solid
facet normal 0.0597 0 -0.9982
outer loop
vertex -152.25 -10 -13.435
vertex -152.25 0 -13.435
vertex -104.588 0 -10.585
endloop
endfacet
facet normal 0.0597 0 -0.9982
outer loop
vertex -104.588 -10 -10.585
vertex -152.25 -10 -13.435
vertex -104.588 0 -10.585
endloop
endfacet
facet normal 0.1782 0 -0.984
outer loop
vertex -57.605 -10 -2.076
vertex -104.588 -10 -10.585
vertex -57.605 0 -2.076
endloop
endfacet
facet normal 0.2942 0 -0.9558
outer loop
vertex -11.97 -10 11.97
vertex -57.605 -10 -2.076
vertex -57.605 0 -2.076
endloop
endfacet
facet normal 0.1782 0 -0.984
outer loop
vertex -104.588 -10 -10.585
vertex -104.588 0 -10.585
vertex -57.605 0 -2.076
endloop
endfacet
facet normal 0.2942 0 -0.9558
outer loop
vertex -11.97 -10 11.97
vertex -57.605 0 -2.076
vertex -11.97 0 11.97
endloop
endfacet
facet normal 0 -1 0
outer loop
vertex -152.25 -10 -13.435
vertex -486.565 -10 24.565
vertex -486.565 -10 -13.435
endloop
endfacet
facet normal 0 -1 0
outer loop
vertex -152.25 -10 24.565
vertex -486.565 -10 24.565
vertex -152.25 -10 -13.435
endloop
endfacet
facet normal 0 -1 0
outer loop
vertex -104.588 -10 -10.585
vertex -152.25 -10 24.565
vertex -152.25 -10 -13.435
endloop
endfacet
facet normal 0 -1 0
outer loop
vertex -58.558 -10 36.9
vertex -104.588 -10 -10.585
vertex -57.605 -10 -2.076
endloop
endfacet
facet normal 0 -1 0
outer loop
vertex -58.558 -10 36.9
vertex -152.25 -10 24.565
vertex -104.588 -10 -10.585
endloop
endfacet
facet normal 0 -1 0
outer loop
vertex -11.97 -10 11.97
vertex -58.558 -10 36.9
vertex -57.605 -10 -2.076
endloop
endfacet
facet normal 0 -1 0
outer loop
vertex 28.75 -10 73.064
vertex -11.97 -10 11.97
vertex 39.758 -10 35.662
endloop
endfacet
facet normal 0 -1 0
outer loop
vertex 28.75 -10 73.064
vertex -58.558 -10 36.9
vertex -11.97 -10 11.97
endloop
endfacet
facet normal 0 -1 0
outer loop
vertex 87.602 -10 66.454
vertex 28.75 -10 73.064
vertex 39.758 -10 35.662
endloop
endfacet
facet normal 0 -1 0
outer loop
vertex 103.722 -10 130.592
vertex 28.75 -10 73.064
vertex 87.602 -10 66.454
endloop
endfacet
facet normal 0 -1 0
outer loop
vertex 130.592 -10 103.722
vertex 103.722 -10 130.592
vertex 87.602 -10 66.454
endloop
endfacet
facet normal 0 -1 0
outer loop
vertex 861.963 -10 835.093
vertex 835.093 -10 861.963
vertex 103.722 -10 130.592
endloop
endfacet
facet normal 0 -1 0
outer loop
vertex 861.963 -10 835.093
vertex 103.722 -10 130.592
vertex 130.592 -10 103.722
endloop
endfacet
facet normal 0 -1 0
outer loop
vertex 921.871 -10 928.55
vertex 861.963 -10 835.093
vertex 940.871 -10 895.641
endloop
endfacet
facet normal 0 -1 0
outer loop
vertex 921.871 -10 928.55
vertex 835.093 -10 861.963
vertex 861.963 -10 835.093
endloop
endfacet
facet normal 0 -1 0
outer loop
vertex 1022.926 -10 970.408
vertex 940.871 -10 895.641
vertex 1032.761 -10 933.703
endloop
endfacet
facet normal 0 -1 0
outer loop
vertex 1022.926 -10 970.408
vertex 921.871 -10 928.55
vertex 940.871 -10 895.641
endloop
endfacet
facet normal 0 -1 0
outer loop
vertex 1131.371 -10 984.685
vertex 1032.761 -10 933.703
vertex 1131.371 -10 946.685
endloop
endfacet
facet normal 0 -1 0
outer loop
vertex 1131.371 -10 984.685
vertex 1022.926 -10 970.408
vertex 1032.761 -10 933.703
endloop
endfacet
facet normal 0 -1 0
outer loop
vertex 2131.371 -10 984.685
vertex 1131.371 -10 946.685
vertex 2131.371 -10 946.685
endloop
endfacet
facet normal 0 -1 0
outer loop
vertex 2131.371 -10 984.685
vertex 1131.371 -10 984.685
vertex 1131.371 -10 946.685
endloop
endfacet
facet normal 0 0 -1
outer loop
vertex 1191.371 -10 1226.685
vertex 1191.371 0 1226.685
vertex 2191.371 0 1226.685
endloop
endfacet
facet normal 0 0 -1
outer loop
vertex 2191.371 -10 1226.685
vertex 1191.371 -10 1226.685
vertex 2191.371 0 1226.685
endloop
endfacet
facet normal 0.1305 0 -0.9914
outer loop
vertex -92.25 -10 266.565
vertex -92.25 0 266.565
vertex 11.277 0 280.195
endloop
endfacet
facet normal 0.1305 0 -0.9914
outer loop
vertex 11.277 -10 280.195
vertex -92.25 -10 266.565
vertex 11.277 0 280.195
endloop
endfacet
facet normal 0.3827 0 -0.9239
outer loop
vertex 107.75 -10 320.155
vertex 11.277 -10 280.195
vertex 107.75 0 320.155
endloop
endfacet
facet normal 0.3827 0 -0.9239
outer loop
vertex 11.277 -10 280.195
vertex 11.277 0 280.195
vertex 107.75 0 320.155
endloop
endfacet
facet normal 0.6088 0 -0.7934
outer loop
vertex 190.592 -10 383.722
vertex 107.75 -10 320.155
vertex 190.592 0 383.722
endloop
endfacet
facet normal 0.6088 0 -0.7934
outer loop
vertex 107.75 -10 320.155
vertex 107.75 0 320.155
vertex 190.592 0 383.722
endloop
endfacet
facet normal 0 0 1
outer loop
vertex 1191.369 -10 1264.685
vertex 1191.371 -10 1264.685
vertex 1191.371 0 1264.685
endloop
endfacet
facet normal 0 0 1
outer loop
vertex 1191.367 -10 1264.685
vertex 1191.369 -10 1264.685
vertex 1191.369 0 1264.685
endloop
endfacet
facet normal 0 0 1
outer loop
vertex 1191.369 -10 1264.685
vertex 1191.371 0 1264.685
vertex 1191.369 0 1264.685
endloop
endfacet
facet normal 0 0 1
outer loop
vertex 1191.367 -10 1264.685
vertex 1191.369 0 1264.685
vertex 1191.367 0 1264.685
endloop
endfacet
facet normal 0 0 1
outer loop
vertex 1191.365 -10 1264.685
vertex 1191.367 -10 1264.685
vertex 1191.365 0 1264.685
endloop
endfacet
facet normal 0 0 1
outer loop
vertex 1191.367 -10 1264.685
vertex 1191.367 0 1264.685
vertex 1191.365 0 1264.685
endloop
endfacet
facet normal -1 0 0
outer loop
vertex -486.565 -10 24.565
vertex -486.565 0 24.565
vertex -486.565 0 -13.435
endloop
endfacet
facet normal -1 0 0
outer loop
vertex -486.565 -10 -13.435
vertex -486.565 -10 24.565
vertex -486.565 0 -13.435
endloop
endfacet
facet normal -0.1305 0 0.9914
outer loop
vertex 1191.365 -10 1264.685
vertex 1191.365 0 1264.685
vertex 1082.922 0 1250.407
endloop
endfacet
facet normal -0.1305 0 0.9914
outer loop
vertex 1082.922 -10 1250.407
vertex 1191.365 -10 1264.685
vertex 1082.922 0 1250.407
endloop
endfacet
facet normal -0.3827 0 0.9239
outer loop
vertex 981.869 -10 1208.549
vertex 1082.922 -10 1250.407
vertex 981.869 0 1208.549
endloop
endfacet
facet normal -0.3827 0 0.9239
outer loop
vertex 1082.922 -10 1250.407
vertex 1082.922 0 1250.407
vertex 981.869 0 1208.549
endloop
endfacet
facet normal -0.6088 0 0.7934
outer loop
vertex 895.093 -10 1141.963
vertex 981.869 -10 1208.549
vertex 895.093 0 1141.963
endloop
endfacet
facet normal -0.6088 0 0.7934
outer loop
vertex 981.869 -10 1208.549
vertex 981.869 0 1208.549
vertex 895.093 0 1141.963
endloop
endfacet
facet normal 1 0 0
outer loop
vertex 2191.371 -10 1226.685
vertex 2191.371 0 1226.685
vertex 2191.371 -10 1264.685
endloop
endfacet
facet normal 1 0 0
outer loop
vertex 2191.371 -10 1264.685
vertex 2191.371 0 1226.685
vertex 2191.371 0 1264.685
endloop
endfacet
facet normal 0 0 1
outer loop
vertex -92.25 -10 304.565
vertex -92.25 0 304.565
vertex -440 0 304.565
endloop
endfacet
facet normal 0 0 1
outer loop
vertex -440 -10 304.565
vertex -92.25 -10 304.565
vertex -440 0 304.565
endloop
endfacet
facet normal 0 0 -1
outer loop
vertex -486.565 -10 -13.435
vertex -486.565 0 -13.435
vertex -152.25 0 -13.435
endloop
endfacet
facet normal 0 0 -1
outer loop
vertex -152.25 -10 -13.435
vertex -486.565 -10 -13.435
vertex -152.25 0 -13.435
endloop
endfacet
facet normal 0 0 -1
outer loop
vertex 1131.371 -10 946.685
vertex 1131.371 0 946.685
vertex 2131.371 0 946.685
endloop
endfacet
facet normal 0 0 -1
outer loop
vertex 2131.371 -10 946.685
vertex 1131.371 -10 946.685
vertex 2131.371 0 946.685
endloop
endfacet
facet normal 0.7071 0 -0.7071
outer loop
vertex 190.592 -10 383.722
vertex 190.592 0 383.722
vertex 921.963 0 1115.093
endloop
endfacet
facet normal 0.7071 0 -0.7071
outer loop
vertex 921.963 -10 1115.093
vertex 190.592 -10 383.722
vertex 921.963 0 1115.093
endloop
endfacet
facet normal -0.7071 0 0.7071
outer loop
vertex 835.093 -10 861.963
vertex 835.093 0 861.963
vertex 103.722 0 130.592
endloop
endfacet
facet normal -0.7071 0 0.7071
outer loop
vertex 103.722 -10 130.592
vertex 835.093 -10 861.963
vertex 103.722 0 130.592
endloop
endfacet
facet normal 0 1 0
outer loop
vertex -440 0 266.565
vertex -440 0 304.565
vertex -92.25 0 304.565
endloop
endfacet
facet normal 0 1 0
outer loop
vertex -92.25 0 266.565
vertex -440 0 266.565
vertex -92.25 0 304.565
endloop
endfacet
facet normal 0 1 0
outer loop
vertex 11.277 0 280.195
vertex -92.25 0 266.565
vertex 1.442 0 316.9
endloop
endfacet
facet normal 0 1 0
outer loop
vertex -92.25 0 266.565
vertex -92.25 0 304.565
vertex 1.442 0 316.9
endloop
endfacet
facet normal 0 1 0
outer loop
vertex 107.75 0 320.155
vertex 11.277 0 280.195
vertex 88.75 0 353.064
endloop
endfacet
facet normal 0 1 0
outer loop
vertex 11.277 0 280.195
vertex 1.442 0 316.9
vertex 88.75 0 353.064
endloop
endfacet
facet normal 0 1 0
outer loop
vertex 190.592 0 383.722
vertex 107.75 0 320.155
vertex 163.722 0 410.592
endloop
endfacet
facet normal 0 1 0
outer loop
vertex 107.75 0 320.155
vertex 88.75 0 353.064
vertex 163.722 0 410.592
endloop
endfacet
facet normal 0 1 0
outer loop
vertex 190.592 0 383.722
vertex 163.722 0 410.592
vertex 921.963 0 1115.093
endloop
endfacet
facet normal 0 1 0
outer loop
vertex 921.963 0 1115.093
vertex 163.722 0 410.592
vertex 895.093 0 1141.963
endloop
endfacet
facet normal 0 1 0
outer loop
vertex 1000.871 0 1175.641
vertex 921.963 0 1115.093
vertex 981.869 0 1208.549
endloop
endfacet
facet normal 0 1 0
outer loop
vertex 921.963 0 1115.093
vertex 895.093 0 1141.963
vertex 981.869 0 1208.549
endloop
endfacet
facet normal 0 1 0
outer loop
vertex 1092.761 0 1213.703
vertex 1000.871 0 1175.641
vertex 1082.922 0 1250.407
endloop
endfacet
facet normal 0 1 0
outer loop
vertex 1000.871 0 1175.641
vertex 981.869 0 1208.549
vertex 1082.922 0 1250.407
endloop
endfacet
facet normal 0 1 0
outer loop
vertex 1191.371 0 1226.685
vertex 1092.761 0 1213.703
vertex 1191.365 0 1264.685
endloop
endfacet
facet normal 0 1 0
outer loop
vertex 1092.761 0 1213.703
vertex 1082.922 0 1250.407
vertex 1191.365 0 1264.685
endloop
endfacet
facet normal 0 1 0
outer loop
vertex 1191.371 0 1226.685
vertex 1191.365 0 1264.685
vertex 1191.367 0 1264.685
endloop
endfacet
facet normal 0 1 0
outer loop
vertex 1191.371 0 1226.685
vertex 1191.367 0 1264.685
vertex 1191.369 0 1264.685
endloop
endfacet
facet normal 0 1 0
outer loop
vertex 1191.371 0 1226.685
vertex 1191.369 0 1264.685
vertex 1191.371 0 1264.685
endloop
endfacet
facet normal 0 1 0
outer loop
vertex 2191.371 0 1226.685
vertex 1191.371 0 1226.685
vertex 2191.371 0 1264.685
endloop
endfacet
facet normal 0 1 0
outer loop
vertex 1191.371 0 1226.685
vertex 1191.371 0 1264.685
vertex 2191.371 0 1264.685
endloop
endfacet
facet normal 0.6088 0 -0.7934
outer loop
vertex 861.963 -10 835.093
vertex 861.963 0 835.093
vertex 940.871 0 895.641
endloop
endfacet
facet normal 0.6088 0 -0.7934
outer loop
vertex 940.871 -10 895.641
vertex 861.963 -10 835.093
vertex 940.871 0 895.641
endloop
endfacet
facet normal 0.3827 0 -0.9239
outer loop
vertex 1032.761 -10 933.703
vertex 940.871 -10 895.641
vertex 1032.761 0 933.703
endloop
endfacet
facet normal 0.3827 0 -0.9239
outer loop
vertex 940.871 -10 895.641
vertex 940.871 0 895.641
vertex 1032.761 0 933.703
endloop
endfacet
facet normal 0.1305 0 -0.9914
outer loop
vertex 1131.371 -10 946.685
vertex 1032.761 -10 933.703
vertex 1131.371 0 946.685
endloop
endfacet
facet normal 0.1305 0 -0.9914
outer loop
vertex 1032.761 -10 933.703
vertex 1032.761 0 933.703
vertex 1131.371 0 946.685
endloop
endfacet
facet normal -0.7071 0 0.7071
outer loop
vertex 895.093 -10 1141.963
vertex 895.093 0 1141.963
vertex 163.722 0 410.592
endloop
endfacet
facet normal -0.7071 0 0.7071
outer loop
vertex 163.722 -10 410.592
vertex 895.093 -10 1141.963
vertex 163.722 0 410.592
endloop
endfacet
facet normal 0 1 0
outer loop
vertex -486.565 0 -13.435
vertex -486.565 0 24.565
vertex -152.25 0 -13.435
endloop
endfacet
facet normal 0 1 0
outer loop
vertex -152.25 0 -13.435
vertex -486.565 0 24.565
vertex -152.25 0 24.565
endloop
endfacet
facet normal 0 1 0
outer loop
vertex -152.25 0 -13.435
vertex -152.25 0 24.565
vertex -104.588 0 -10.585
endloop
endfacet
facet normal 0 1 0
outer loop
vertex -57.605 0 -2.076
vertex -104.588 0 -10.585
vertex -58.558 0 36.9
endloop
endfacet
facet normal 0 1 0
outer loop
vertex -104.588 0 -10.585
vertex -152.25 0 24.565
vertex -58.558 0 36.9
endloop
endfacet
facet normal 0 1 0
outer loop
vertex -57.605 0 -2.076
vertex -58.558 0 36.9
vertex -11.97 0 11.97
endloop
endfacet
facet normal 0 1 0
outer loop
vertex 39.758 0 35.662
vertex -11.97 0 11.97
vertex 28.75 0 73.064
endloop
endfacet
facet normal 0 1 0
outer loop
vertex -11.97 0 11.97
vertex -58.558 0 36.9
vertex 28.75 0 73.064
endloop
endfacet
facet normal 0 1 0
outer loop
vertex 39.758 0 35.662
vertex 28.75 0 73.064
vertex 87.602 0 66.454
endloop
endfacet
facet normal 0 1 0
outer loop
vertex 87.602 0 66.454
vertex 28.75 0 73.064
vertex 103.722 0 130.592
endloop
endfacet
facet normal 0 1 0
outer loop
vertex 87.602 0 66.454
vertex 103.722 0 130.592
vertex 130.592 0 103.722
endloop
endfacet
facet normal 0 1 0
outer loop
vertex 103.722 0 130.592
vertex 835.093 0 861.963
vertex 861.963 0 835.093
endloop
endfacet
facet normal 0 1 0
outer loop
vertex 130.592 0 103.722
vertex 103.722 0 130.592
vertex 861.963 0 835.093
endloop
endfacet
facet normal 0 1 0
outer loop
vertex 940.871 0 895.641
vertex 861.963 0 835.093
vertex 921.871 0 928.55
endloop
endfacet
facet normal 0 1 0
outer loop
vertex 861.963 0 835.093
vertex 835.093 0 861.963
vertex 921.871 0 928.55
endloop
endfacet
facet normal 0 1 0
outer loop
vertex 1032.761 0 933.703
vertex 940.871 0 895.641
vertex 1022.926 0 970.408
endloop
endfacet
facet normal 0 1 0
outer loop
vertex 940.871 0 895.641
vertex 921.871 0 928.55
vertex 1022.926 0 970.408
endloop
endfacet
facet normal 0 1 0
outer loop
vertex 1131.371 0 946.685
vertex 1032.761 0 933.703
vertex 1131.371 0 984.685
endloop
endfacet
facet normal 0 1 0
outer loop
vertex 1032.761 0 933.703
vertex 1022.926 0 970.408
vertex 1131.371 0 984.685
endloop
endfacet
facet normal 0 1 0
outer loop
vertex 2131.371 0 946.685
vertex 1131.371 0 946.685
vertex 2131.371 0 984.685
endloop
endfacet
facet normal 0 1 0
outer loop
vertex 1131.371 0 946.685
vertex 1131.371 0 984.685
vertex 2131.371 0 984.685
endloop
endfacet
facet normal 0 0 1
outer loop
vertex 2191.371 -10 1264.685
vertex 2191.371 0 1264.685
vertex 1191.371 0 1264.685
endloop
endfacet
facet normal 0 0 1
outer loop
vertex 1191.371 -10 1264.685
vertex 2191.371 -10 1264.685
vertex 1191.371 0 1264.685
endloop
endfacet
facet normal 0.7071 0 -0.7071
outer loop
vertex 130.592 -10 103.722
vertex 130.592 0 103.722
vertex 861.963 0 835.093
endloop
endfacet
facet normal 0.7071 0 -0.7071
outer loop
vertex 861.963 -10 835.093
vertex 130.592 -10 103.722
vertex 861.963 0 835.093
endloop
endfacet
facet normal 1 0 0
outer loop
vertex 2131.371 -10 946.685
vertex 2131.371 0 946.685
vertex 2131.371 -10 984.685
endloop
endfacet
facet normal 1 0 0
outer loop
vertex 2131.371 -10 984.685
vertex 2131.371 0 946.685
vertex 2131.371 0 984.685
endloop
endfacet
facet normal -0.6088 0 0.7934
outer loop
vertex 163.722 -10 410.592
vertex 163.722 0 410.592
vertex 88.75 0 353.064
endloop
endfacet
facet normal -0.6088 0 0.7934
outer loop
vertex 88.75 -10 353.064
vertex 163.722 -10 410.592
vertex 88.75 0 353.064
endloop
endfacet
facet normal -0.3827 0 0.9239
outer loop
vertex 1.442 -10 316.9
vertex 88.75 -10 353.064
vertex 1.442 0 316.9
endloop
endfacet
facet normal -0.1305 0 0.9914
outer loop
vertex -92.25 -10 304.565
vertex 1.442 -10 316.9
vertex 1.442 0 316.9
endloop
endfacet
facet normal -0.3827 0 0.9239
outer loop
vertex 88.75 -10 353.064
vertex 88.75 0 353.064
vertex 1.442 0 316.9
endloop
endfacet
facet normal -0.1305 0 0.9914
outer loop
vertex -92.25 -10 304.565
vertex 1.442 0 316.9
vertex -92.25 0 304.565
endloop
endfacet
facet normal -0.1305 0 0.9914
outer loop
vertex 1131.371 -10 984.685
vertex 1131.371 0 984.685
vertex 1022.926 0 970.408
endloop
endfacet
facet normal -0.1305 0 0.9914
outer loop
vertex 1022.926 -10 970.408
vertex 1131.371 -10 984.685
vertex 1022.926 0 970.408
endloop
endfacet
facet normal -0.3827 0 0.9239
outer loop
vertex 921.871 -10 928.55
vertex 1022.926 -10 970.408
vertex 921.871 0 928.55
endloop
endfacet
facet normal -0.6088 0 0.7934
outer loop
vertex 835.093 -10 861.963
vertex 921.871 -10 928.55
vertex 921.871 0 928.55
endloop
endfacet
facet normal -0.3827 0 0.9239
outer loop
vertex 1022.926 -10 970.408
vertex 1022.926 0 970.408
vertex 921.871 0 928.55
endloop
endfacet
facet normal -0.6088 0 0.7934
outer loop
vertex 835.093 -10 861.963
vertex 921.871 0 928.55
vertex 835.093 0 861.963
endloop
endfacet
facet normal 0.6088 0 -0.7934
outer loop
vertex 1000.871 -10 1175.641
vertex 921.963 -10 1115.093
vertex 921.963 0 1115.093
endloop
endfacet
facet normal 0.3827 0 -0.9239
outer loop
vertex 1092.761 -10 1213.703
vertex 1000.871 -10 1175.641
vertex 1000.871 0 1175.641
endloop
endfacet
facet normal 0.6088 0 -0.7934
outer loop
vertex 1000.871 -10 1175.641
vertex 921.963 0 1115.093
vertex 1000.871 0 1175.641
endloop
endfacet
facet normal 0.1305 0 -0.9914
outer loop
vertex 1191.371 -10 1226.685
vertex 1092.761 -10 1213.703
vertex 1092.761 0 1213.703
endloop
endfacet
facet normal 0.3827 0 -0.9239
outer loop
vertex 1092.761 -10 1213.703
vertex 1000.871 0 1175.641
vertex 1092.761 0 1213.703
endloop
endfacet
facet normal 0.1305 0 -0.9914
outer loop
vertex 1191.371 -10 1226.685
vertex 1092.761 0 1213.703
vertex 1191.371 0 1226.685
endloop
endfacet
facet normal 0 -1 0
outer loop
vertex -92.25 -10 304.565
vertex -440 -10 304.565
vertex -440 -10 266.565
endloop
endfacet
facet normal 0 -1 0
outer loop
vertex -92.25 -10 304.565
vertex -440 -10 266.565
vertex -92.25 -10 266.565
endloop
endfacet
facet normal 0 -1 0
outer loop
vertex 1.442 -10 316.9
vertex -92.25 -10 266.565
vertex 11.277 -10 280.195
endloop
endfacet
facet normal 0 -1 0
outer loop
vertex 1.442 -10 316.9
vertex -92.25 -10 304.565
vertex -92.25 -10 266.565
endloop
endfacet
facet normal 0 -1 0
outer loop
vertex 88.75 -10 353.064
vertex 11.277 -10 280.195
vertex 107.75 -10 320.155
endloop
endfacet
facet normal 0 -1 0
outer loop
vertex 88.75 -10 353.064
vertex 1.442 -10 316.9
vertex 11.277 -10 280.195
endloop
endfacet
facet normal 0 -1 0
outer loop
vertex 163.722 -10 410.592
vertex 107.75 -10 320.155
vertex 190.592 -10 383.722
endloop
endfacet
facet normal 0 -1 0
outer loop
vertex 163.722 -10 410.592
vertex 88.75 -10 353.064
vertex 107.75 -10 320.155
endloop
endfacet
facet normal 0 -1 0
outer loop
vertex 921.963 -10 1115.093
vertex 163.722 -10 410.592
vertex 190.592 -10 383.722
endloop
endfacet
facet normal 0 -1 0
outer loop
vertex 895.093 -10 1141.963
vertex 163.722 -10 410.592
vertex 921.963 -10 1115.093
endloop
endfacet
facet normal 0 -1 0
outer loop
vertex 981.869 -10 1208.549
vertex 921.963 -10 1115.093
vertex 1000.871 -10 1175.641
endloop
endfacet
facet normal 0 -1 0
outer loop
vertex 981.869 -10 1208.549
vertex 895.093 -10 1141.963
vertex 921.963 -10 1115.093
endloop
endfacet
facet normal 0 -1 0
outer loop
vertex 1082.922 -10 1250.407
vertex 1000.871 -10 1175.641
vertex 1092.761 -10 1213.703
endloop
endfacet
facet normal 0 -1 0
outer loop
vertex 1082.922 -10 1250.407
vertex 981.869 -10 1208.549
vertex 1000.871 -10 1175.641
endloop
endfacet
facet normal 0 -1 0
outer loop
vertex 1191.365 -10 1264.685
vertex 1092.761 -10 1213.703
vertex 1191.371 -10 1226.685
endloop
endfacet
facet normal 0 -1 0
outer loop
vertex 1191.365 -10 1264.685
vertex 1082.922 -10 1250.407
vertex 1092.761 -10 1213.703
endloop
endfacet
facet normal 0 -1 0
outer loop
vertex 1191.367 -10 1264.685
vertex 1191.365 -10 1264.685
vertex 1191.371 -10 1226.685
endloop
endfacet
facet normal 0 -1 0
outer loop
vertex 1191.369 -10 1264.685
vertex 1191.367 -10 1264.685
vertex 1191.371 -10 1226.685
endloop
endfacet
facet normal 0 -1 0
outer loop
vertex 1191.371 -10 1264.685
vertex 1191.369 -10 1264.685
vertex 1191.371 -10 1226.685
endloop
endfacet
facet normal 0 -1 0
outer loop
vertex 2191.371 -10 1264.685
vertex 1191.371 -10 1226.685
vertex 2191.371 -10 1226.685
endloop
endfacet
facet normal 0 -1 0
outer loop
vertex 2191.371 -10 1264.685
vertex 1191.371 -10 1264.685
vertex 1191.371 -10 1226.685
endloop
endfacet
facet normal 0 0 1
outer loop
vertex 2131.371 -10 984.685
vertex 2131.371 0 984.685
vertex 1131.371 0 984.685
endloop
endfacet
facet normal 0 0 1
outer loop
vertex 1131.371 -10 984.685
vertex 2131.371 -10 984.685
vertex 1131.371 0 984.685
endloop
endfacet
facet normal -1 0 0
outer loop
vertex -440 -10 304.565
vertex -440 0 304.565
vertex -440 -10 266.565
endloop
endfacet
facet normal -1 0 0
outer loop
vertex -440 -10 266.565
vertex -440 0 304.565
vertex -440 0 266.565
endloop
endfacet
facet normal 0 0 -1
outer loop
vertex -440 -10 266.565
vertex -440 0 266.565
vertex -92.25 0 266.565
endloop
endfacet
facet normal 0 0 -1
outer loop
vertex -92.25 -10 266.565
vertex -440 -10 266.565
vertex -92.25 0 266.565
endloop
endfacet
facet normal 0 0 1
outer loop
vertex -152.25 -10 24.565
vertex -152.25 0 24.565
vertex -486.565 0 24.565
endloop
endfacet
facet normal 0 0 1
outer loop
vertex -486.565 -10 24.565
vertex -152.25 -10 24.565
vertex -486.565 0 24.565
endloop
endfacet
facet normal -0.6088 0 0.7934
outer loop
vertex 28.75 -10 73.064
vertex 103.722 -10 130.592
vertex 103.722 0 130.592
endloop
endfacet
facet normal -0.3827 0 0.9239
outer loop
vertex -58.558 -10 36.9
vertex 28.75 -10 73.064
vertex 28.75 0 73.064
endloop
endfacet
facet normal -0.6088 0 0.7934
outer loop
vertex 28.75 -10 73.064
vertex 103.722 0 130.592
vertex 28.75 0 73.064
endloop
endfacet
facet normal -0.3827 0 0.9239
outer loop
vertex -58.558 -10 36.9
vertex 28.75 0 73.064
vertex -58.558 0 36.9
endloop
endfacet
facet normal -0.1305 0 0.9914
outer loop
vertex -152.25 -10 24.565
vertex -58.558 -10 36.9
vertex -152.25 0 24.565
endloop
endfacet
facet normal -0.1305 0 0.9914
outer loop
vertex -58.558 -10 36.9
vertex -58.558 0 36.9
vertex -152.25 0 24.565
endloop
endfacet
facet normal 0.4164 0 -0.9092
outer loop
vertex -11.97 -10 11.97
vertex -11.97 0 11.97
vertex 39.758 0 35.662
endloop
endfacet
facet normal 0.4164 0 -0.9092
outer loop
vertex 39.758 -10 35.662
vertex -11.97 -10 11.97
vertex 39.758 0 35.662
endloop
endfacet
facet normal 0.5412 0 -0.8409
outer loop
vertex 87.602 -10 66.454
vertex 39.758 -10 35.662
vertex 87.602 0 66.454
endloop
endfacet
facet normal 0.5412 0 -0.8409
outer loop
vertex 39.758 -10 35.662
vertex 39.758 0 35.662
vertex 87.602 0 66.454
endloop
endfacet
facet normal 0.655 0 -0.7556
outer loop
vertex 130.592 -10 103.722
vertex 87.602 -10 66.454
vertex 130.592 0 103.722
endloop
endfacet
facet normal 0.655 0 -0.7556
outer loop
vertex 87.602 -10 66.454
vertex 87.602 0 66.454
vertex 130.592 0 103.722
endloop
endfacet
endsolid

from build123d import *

# Parameters (mm, degrees)
F1_DEPTH = 10


# Not quite as in the source:
# - a feature names something its author has since deleted; it is built from what else it names


with BuildPart() as f1:
    # F0 (on Front) → F1 (new body)
    with BuildSketch(Plane.XZ):
        with BuildLine():
            Line((897.5679823155, 1139.4882925322), (807.5679823155, 1049.4882925322))
            Line((807.5679823155, 1049.4882925322), (805.0931085813, 1051.9631662664))
            Line((805.0931085813, 1051.9631662664), (163.7222586828, 410.5923163679))
            ThreePointArc((163.7222586828, 410.5923163679), (46.2810064095, 332.1205803884), (-92.2503961067, 304.5649711575))
            Line((-92.2503961067, 304.5649711575), (-105.134062469, 304.5649711575))
            Line((-105.134062469, 304.5649711575), (-440, 304.5649711575))
            Line((-440, 304.5649711575), (-440, 266.5649711575))
            Line((-440, 266.5649711575), (-92.2503961067, 266.5649711575))
            ThreePointArc((-92.2503961067, 266.5649711575), (60.8229768393, 297.0131581529), (190.5923163679, 383.7222586828))
            Line((190.5923163679, 383.7222586828), (921.9631662664, 1115.0931085813))
            ThreePointArc((921.9631662664, 1115.0931085813), (1045.5684621674, 1197.683526836), (1191.3708498985, 1226.6854249492))
            Line((1191.3708498985, 1226.6854249492), (2191.3708498985, 1226.6854249492))
            Line((2191.3708498985, 1226.6854249492), (2191.3708498985, 1245.6854249492))
            Line((2191.3708498985, 1245.6854249492), (2191.3708498985, 1261.1854249041))
            Line((2191.3708498985, 1261.1854249041), (1191.3647249172, 1261.1854249041))
            ThreePointArc((1191.3647249172, 1261.1854249041), (1032.3630543827, 1229.5561987328), (897.5679823155, 1139.4882925322))
        make_face()
        Polygon((805.0931085813, 1051.9631662664), (807.5679823155, 1049.4882925322), (897.5679823155, 1139.4882925322), (895.0931085813, 1141.9631662664), align=None)
        with BuildLine():
            Line((895.0931085813, 1141.9631662664), (897.5679823155, 1139.4882925322))
            ThreePointArc((897.5679823155, 1139.4882925322), (1032.3630543827, 1229.5561987328), (1191.3647249172, 1261.1854249041))
            Line((1191.3647249172, 1261.1854249041), (2191.3708498985, 1261.1854249041))
            Line((2191.3708498985, 1261.1854249041), (2191.3708498985, 1264.6854249492))
            Line((2191.3708498985, 1264.6854249492), (1191.3708498985, 1264.6854249492))
            ThreePointArc((1191.3708498985, 1264.6854249492), (1191.3677874079, 1264.685424938), (1191.3647249172, 1264.6854249045))
            ThreePointArc((1191.3647249172, 1264.6854249045), (1031.0236623694, 1232.7897770967), (895.0931085813, 1141.9631662664))
        make_face()
    extrude(amount=F1_DEPTH)


with BuildPart() as f1b:
    # F0 (on Front) → F1, piece 2 (new body)
    with BuildSketch(Plane.XZ):
        with BuildLine():
            Line((837.5679823155, 859.4882925322), (835.0931085813, 861.9631662664))
            Line((835.0931085813, 861.9631662664), (103.7222586828, 130.5923163679))
            ThreePointArc((103.7222586828, 130.5923163679), (-13.7189935905, 52.1205803884), (-152.2503961067, 24.5649711575))
            Line((-152.2503961067, 24.5649711575), (-486.5649711575, 24.5649711575))
            Line((-486.5649711575, 24.5649711575), (-486.5649711575, -13.4350288425))
            Line((-486.5649711575, -13.4350288425), (-152.2503961067, -13.4350288425))
            ThreePointArc((-152.2503961067, -13.4350288425), (-80.9692466878, -7.0325361232), (-11.9699824698, 11.9699824698))
            ThreePointArc((-11.9699824698, 11.9699824698), (64.2280439518, 50.206405056), (130.5923163679, 103.7222586828))
            Line((130.5923163679, 103.7222586828), (861.9631662664, 835.0931085813))
            Line((861.9631662664, 835.0931085813), (848.5281374239, 848.5281374239))
            Line((848.5281374239, 848.5281374239), (837.5679823155, 859.4882925322))
        make_face()
        with BuildLine():
            ThreePointArc((1131.3708498985, 984.6854249492), (971.0264917375, 952.7909490715), (835.0931085813, 861.9631662664))
            Line((835.0931085813, 861.9631662664), (837.5679823155, 859.4882925322))
            Line((837.5679823155, 859.4882925322), (848.5281374239, 848.5281374239))
            Line((848.5281374239, 848.5281374239), (861.9631662664, 835.0931085813))
            ThreePointArc((861.9631662664, 835.0931085813), (985.5684621674, 917.683526836), (1131.3708498985, 946.6854249492))
            Line((1131.3708498985, 946.6854249492), (1131.3708498985, 965.6854249492))
            Line((1131.3708498985, 965.6854249492), (1131.3708498985, 984.6854249492))
        make_face()
        Polygon((2131.3708498985, 984.6854249492), (1131.3708498985, 984.6854249492), (1131.3708498985, 965.6854249492), (1131.3708498985, 946.6854249492), (2131.3708498985, 946.6854249492), align=None)
    extrude(amount=F1_DEPTH)


solid = Compound([f1.part, f1b.part])
